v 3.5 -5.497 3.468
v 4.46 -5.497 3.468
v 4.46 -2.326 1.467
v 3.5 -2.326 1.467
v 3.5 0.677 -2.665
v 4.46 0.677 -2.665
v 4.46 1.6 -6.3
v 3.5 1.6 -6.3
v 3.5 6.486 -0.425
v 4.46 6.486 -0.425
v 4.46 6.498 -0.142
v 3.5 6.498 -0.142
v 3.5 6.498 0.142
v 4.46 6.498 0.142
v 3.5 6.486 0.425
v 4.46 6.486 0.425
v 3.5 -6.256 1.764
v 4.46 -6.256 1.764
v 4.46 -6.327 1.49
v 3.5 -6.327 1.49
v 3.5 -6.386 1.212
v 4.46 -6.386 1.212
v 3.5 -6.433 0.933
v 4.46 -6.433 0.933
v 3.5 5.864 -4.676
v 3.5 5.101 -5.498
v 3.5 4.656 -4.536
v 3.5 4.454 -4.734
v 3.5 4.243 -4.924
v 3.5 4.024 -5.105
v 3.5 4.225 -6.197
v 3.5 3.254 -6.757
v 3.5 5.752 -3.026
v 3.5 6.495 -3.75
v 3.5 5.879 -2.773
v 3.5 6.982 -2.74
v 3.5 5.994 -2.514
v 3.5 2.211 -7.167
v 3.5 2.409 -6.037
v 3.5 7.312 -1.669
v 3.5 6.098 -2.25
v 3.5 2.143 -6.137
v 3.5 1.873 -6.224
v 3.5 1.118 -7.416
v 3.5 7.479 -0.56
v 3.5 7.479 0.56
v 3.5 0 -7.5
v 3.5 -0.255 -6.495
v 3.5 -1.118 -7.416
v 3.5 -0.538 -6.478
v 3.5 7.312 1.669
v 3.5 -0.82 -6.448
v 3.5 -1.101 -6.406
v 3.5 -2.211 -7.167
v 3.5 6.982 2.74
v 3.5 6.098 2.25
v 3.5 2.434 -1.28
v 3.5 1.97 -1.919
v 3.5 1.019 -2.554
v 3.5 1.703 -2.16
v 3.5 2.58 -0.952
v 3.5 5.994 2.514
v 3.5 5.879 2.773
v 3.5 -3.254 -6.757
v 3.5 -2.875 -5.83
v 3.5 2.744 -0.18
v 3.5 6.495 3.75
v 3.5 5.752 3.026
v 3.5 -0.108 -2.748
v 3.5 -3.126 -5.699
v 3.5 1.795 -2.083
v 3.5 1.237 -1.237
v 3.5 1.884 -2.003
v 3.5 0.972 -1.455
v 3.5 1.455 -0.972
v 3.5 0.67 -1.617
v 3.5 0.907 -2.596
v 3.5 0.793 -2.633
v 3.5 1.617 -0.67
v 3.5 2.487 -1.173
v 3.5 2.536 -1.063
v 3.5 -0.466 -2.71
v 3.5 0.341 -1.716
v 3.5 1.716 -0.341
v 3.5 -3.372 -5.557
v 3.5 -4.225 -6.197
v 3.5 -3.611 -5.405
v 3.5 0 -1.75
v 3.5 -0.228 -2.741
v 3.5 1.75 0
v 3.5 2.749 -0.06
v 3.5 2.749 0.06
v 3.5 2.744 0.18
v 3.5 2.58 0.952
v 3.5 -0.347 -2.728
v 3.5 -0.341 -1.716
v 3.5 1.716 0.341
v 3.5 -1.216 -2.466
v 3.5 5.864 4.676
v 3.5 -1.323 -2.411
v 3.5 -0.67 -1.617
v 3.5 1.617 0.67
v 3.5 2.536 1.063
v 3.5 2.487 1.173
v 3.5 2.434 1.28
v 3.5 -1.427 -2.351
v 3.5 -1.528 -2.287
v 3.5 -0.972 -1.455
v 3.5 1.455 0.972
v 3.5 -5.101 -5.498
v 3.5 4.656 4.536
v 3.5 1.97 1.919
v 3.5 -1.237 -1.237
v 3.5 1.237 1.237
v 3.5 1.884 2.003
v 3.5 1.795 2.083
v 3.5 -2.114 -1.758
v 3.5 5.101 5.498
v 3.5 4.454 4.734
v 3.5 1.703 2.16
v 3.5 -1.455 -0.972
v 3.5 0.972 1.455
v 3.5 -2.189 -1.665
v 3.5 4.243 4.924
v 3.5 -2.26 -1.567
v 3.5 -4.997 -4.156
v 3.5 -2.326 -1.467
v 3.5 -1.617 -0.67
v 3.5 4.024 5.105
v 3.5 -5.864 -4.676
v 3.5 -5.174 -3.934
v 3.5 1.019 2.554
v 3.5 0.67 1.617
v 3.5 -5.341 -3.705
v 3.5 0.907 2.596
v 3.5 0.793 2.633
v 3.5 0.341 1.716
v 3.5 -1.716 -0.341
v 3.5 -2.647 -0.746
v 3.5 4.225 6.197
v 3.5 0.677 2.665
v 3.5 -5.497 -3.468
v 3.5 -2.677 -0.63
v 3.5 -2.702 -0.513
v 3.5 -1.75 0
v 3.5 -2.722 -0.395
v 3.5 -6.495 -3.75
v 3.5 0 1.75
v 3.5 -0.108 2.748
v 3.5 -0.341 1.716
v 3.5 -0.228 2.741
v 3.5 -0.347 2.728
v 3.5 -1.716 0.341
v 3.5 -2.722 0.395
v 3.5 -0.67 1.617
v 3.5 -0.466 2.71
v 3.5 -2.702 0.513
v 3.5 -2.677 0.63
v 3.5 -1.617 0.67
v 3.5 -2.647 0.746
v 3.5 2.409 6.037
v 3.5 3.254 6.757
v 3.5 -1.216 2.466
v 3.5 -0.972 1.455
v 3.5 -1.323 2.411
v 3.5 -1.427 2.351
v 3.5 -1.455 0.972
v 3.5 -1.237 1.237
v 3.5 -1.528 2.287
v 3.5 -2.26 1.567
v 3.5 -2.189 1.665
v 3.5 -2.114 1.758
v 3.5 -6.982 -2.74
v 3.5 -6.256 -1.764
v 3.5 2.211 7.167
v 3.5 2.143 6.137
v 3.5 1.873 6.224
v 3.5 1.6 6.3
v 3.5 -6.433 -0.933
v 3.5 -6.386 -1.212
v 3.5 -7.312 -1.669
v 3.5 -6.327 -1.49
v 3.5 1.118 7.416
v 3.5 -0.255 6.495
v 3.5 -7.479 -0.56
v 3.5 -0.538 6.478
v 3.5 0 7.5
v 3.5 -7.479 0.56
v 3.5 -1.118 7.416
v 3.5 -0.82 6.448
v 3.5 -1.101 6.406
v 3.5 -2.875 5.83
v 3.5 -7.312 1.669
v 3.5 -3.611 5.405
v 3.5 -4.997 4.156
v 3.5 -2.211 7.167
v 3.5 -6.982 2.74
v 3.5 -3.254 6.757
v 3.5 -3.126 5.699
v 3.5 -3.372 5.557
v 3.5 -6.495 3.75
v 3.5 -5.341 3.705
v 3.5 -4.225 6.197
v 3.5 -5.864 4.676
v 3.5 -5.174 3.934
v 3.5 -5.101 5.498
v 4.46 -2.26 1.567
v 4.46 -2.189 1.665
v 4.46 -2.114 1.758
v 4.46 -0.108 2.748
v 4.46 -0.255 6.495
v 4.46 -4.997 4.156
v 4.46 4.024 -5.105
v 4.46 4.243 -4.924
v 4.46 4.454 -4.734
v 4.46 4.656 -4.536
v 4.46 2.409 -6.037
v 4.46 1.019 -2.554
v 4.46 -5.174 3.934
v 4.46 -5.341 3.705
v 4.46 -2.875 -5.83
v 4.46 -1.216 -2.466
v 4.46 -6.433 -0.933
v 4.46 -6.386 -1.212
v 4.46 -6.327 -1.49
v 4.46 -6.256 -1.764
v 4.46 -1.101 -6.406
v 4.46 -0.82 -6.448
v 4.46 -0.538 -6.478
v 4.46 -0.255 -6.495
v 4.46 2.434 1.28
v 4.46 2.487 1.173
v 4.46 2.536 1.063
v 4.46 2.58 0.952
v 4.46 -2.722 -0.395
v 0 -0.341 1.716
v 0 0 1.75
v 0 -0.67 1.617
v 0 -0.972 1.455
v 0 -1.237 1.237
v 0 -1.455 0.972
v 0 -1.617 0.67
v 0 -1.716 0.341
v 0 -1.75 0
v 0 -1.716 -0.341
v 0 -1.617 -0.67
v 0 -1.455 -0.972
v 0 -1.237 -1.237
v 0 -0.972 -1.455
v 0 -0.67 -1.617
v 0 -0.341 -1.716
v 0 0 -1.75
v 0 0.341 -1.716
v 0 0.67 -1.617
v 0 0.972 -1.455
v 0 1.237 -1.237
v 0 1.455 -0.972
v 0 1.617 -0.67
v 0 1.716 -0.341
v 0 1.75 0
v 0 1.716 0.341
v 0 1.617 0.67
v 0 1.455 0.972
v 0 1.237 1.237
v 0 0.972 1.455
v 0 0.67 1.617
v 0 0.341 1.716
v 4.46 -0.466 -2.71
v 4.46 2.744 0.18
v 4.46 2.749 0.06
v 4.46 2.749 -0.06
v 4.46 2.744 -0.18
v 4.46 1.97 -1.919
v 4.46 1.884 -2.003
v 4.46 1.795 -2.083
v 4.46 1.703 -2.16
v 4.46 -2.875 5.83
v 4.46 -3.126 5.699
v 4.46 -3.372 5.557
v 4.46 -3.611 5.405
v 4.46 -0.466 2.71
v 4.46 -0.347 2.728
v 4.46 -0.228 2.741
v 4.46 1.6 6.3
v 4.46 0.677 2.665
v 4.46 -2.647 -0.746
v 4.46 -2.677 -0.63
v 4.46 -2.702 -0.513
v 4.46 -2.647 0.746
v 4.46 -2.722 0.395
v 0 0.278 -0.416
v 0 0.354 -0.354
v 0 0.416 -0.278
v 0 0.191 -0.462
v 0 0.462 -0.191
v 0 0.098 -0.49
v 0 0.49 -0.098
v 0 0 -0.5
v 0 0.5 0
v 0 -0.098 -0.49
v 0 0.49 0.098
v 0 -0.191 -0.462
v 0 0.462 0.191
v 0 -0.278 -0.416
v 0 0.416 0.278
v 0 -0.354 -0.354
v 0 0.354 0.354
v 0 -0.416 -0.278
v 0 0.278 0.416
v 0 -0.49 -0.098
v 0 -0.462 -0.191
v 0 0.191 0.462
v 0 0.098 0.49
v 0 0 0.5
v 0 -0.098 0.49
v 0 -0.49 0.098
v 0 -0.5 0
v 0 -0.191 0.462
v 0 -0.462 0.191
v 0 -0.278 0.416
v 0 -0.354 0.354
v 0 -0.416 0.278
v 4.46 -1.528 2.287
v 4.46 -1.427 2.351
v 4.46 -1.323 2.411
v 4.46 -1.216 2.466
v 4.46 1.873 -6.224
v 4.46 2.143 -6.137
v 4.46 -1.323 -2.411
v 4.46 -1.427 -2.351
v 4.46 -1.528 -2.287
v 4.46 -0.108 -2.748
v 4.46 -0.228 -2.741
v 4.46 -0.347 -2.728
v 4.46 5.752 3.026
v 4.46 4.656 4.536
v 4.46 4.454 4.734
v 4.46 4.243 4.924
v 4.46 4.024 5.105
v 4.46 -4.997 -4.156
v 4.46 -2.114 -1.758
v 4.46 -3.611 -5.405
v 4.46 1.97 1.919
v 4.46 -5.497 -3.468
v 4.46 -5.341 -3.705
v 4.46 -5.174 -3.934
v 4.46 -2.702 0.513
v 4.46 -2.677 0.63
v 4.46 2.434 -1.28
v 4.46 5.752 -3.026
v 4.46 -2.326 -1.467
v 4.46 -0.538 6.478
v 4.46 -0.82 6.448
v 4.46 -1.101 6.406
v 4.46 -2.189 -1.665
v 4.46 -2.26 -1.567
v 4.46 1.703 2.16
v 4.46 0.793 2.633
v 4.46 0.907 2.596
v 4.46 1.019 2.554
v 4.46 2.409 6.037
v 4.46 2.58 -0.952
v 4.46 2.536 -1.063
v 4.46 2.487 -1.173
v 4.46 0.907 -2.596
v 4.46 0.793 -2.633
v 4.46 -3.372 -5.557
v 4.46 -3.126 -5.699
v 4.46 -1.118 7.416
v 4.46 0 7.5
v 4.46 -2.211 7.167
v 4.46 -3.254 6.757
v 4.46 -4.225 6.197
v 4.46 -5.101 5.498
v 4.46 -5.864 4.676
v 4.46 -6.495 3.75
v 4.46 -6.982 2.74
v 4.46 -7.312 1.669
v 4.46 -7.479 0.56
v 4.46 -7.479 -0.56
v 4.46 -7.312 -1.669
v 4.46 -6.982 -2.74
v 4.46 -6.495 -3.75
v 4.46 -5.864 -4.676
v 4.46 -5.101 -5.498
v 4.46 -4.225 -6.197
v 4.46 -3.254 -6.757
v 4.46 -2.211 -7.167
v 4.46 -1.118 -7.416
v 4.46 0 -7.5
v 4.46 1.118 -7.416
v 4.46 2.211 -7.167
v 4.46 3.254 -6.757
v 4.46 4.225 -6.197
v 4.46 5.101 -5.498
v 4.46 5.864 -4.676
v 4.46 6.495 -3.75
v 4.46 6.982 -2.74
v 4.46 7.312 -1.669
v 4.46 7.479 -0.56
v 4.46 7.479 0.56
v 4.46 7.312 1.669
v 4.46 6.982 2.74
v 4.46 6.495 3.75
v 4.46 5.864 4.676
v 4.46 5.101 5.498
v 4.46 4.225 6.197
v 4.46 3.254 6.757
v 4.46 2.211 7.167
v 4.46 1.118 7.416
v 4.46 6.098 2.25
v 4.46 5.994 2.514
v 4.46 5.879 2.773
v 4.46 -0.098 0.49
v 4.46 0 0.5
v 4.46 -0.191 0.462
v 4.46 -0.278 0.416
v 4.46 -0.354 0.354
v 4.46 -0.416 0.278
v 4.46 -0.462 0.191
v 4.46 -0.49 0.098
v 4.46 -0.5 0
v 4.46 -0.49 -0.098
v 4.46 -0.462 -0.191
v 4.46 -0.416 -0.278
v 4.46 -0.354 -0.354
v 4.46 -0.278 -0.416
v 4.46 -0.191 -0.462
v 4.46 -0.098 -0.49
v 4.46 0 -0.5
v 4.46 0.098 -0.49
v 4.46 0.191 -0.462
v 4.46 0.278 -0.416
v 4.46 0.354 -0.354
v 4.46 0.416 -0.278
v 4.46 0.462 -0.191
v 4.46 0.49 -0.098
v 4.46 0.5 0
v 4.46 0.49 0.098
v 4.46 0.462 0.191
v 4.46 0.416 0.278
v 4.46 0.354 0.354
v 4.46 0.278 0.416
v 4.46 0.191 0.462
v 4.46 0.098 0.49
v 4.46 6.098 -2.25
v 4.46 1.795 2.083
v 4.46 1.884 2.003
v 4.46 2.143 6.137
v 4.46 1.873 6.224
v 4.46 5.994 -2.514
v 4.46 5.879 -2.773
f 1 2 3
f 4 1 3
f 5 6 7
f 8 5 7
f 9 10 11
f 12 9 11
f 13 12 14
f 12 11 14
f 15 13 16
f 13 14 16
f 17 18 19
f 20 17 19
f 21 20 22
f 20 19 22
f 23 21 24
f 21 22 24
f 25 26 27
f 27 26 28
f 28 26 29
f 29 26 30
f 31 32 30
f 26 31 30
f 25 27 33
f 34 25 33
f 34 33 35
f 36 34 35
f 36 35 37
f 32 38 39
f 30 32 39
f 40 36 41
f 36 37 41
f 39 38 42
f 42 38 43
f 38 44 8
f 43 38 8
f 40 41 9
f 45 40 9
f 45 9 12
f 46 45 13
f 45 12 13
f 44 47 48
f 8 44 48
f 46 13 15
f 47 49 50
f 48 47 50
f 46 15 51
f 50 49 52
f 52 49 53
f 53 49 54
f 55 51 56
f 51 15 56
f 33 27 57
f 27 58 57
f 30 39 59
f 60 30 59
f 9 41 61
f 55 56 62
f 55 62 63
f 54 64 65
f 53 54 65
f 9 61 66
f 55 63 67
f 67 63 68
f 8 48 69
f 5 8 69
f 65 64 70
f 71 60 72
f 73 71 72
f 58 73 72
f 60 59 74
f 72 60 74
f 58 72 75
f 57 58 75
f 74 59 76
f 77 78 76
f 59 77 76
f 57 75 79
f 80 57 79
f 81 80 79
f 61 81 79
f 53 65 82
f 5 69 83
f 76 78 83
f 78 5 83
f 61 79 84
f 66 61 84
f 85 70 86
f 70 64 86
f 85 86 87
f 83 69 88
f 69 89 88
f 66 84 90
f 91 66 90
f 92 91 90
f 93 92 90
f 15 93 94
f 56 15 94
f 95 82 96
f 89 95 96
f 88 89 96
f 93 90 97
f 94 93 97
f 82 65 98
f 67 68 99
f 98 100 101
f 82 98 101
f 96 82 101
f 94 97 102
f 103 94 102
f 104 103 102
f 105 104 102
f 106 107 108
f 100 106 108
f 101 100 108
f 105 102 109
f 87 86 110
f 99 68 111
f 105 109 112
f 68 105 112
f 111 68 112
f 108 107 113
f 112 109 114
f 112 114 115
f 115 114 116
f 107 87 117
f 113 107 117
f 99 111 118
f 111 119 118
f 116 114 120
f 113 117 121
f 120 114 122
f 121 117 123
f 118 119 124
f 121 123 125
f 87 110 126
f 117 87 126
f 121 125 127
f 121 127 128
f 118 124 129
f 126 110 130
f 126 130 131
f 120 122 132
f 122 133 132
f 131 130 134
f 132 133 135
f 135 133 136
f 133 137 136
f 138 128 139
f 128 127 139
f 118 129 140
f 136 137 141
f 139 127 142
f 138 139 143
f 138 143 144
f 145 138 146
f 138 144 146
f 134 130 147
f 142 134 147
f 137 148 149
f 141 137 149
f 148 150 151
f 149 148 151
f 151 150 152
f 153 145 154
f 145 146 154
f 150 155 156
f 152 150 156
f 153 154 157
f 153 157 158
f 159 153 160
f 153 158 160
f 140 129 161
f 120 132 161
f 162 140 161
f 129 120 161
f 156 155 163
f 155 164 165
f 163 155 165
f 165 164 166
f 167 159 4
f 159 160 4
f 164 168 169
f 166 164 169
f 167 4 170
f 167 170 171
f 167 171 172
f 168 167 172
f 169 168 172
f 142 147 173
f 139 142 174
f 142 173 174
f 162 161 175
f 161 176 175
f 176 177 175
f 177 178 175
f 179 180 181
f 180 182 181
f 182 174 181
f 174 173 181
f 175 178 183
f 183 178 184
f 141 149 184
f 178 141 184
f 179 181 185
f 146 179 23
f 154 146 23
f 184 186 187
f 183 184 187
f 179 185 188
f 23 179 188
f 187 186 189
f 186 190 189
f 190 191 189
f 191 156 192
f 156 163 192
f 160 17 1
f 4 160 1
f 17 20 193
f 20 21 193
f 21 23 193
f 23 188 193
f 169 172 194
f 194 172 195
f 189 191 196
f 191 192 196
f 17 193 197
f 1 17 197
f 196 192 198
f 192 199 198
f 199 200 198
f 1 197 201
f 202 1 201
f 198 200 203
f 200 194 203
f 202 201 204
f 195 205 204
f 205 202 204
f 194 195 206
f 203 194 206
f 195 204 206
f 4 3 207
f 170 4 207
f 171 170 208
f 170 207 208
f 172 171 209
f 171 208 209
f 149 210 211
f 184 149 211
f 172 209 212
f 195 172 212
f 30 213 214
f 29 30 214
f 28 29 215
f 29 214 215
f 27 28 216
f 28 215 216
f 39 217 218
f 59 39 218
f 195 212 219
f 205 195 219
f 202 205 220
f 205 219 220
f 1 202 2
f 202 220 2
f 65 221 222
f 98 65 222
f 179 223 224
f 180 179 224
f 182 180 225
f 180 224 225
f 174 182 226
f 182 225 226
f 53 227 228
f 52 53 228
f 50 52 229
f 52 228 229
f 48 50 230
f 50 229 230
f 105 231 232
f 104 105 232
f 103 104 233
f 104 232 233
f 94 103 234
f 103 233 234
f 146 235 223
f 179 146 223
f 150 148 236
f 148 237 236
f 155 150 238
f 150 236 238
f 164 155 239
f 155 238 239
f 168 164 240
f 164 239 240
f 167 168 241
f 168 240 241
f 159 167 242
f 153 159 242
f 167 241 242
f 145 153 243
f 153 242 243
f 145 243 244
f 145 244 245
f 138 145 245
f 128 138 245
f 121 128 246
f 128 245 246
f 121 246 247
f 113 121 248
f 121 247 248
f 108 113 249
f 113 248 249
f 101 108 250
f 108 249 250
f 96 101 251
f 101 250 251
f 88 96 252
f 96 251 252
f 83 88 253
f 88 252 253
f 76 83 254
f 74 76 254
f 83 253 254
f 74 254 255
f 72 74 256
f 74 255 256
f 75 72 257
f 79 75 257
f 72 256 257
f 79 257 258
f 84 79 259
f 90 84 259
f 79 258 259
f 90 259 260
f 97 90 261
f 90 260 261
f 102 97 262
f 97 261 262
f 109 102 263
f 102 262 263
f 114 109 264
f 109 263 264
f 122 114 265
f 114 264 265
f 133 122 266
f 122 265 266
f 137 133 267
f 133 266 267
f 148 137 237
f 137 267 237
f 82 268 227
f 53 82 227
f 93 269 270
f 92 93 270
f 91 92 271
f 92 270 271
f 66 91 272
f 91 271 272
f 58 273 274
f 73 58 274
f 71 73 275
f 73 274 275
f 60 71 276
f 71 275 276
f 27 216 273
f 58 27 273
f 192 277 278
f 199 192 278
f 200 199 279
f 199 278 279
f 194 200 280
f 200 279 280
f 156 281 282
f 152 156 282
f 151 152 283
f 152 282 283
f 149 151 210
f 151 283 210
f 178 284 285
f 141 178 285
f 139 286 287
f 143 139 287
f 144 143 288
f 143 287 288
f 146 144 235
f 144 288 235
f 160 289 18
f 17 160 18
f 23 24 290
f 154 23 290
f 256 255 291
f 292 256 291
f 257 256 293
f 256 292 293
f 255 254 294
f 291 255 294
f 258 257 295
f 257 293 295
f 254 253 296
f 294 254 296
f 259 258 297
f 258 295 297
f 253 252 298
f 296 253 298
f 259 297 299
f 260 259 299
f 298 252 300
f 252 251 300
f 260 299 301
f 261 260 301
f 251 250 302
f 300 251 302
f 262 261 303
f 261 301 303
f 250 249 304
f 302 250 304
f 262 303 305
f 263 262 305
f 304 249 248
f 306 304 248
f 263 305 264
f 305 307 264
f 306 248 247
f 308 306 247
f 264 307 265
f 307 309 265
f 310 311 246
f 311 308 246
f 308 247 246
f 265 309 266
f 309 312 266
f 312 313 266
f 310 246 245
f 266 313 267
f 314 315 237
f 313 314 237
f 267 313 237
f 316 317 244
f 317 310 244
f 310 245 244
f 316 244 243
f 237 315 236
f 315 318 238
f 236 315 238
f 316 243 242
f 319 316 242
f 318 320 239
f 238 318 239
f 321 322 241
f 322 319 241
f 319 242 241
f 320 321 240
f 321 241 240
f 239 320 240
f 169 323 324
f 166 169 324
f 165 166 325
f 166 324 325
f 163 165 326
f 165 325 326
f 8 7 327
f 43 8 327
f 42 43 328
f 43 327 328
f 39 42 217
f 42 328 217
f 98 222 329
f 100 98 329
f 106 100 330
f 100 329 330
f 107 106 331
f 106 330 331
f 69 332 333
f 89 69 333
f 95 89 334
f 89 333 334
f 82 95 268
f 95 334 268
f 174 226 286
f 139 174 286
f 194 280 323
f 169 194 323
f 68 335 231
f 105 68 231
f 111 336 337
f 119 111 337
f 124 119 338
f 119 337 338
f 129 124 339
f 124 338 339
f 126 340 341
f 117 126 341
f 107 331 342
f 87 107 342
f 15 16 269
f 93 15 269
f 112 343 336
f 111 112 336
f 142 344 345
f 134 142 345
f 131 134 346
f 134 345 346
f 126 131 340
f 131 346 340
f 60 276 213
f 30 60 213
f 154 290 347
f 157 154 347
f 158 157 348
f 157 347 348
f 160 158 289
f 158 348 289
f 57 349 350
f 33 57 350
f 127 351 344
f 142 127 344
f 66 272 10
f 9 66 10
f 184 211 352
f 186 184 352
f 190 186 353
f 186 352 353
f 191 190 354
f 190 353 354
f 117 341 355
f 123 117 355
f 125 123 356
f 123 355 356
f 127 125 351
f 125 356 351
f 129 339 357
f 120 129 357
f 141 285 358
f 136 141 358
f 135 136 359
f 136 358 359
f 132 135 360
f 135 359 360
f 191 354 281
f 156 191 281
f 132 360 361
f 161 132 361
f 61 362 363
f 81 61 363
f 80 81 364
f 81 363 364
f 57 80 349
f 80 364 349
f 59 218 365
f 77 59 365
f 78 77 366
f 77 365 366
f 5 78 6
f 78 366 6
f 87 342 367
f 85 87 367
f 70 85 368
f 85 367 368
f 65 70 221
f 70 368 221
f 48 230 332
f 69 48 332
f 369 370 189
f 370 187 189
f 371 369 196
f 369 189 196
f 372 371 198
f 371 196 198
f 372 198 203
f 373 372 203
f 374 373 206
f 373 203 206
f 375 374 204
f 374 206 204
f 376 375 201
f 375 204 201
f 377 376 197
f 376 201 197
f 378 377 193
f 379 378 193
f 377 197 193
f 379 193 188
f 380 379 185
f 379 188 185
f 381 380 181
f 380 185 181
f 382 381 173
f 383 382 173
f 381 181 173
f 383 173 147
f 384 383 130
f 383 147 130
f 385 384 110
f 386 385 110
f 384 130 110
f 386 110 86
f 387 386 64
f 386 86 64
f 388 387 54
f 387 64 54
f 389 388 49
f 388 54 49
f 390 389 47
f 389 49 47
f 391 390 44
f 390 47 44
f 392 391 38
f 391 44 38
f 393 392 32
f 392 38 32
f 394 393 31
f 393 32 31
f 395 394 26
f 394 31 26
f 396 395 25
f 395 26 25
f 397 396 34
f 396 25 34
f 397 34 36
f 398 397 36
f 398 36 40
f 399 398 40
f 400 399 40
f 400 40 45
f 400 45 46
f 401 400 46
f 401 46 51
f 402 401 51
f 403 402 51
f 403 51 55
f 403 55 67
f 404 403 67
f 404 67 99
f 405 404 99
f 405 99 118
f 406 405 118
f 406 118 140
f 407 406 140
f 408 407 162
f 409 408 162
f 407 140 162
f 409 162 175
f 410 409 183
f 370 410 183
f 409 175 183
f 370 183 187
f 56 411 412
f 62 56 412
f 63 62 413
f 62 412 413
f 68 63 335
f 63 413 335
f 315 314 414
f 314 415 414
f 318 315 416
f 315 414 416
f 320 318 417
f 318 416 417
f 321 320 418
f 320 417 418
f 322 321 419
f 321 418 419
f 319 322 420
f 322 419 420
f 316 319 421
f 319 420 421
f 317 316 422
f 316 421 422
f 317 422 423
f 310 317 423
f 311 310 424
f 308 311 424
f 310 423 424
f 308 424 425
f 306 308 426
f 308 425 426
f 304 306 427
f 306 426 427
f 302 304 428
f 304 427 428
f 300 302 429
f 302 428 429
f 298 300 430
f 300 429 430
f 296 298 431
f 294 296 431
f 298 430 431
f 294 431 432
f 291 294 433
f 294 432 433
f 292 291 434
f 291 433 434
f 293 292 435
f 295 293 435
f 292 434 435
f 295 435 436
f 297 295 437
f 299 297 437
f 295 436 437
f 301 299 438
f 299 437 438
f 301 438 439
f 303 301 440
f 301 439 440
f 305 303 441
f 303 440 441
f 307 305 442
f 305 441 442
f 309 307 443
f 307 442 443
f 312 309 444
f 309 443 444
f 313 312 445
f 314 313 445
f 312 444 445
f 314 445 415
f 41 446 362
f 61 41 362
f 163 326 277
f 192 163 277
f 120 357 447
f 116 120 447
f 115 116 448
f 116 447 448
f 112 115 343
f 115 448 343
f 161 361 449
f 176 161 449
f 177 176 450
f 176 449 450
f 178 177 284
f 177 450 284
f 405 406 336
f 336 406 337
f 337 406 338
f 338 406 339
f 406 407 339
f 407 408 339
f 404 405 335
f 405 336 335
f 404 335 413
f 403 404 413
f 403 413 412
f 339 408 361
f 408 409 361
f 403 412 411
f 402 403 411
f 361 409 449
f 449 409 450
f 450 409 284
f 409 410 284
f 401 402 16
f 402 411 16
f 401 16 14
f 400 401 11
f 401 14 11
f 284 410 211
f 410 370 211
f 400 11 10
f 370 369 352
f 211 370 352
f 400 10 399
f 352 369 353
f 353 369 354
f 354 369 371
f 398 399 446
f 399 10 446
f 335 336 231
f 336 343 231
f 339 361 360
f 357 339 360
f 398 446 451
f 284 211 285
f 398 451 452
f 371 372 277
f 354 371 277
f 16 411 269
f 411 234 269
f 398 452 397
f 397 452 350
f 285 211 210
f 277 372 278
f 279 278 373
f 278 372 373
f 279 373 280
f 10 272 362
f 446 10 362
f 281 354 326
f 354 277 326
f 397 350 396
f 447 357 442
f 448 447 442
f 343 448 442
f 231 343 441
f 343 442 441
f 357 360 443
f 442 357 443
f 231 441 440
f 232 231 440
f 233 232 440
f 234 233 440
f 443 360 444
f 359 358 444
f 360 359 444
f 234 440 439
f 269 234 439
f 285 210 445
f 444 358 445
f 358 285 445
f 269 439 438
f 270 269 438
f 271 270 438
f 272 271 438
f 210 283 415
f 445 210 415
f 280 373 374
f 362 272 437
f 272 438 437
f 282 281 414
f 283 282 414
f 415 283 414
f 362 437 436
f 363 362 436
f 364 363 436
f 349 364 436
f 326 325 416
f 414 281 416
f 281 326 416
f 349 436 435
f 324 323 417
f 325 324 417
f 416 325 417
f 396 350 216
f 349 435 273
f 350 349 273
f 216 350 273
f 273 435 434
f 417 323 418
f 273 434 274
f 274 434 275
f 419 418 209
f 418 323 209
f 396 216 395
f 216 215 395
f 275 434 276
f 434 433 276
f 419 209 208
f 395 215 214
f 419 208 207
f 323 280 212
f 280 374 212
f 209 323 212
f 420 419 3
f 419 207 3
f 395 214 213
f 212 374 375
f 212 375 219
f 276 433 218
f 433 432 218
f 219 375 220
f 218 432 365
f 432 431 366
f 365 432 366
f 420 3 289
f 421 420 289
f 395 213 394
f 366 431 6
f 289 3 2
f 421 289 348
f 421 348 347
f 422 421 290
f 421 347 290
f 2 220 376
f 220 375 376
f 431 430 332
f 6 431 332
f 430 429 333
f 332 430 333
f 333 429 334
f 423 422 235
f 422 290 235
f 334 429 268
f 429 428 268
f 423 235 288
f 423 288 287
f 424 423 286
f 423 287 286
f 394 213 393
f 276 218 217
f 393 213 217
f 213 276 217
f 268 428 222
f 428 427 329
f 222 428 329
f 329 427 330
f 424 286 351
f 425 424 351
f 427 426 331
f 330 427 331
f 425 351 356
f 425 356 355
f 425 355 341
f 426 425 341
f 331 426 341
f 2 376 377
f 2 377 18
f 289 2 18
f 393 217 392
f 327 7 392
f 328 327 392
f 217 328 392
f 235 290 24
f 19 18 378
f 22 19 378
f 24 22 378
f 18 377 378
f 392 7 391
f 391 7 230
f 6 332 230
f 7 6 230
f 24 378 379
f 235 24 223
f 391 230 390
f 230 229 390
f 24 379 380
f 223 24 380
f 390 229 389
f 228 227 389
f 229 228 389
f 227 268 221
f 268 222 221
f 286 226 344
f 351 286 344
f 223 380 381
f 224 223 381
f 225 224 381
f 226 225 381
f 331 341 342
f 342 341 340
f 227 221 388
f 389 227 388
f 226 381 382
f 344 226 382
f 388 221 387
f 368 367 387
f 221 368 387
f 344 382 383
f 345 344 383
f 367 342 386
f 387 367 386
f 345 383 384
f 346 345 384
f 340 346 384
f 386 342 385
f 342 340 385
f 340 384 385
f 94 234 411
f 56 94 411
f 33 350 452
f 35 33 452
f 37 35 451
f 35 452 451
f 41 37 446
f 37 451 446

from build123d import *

# Parameters (mm, degrees)
CUT_EXTRUDE1_DEPTH = 12.506154875
CIRPATTERN1_COUNT  = 15


with BuildPart() as part:
    # Sketch1 → Revolve1 (revolve)
    with BuildSketch(Plane.XY, mode=Mode.PRIVATE) as revolve1_sk:
        Polygon((0, 0.5), (4.46, 0.5), (4.46, 7.5), (3.5, 7.5), (3.5, 1.75), (0, 1.75), align=None)
    revolve(revolve1_sk.sketch.rotate(Axis((-1851.483850706, 0, 0), (1, 0, 0)), 90), axis=Axis((-1851.483850706, 0, 0), (1, 0, 0)))

    # Sketch2 → Cut-Extrude1 (cut, through all)
    with BuildSketch(Plane(origin=(4.46, 0, 0), x_dir=(0, 0, -1), z_dir=(1, 0, 0))):
        with BuildLine():
            Line((-0.42512034, 6.486083001), (-0.179858605, 2.744112039))
            ThreePointArc((-0.179858605, 2.744112039), (0, 2.75), (0.179858605, 2.744112039))
            Line((0.179858605, 2.744112039), (0.42512034, 6.486083001))
            ThreePointArc((0.42512034, 6.486083001), (0, 6.5), (-0.42512034, 6.486083001))
        make_face()
    cut_extrude1 = extrude(amount=-CUT_EXTRUDE1_DEPTH, mode=Mode.SUBTRACT)

    # CirPattern1: Cut-Extrude1 ×15 about axis
    cirpattern1_axis = Axis((0, 0, 0), (1, 0, 0))
    for i in range(1, CIRPATTERN1_COUNT):
        add(cut_extrude1.rotate(cirpattern1_axis, i * 360 / CIRPATTERN1_COUNT), mode=Mode.SUBTRACT)


solid = part.part
